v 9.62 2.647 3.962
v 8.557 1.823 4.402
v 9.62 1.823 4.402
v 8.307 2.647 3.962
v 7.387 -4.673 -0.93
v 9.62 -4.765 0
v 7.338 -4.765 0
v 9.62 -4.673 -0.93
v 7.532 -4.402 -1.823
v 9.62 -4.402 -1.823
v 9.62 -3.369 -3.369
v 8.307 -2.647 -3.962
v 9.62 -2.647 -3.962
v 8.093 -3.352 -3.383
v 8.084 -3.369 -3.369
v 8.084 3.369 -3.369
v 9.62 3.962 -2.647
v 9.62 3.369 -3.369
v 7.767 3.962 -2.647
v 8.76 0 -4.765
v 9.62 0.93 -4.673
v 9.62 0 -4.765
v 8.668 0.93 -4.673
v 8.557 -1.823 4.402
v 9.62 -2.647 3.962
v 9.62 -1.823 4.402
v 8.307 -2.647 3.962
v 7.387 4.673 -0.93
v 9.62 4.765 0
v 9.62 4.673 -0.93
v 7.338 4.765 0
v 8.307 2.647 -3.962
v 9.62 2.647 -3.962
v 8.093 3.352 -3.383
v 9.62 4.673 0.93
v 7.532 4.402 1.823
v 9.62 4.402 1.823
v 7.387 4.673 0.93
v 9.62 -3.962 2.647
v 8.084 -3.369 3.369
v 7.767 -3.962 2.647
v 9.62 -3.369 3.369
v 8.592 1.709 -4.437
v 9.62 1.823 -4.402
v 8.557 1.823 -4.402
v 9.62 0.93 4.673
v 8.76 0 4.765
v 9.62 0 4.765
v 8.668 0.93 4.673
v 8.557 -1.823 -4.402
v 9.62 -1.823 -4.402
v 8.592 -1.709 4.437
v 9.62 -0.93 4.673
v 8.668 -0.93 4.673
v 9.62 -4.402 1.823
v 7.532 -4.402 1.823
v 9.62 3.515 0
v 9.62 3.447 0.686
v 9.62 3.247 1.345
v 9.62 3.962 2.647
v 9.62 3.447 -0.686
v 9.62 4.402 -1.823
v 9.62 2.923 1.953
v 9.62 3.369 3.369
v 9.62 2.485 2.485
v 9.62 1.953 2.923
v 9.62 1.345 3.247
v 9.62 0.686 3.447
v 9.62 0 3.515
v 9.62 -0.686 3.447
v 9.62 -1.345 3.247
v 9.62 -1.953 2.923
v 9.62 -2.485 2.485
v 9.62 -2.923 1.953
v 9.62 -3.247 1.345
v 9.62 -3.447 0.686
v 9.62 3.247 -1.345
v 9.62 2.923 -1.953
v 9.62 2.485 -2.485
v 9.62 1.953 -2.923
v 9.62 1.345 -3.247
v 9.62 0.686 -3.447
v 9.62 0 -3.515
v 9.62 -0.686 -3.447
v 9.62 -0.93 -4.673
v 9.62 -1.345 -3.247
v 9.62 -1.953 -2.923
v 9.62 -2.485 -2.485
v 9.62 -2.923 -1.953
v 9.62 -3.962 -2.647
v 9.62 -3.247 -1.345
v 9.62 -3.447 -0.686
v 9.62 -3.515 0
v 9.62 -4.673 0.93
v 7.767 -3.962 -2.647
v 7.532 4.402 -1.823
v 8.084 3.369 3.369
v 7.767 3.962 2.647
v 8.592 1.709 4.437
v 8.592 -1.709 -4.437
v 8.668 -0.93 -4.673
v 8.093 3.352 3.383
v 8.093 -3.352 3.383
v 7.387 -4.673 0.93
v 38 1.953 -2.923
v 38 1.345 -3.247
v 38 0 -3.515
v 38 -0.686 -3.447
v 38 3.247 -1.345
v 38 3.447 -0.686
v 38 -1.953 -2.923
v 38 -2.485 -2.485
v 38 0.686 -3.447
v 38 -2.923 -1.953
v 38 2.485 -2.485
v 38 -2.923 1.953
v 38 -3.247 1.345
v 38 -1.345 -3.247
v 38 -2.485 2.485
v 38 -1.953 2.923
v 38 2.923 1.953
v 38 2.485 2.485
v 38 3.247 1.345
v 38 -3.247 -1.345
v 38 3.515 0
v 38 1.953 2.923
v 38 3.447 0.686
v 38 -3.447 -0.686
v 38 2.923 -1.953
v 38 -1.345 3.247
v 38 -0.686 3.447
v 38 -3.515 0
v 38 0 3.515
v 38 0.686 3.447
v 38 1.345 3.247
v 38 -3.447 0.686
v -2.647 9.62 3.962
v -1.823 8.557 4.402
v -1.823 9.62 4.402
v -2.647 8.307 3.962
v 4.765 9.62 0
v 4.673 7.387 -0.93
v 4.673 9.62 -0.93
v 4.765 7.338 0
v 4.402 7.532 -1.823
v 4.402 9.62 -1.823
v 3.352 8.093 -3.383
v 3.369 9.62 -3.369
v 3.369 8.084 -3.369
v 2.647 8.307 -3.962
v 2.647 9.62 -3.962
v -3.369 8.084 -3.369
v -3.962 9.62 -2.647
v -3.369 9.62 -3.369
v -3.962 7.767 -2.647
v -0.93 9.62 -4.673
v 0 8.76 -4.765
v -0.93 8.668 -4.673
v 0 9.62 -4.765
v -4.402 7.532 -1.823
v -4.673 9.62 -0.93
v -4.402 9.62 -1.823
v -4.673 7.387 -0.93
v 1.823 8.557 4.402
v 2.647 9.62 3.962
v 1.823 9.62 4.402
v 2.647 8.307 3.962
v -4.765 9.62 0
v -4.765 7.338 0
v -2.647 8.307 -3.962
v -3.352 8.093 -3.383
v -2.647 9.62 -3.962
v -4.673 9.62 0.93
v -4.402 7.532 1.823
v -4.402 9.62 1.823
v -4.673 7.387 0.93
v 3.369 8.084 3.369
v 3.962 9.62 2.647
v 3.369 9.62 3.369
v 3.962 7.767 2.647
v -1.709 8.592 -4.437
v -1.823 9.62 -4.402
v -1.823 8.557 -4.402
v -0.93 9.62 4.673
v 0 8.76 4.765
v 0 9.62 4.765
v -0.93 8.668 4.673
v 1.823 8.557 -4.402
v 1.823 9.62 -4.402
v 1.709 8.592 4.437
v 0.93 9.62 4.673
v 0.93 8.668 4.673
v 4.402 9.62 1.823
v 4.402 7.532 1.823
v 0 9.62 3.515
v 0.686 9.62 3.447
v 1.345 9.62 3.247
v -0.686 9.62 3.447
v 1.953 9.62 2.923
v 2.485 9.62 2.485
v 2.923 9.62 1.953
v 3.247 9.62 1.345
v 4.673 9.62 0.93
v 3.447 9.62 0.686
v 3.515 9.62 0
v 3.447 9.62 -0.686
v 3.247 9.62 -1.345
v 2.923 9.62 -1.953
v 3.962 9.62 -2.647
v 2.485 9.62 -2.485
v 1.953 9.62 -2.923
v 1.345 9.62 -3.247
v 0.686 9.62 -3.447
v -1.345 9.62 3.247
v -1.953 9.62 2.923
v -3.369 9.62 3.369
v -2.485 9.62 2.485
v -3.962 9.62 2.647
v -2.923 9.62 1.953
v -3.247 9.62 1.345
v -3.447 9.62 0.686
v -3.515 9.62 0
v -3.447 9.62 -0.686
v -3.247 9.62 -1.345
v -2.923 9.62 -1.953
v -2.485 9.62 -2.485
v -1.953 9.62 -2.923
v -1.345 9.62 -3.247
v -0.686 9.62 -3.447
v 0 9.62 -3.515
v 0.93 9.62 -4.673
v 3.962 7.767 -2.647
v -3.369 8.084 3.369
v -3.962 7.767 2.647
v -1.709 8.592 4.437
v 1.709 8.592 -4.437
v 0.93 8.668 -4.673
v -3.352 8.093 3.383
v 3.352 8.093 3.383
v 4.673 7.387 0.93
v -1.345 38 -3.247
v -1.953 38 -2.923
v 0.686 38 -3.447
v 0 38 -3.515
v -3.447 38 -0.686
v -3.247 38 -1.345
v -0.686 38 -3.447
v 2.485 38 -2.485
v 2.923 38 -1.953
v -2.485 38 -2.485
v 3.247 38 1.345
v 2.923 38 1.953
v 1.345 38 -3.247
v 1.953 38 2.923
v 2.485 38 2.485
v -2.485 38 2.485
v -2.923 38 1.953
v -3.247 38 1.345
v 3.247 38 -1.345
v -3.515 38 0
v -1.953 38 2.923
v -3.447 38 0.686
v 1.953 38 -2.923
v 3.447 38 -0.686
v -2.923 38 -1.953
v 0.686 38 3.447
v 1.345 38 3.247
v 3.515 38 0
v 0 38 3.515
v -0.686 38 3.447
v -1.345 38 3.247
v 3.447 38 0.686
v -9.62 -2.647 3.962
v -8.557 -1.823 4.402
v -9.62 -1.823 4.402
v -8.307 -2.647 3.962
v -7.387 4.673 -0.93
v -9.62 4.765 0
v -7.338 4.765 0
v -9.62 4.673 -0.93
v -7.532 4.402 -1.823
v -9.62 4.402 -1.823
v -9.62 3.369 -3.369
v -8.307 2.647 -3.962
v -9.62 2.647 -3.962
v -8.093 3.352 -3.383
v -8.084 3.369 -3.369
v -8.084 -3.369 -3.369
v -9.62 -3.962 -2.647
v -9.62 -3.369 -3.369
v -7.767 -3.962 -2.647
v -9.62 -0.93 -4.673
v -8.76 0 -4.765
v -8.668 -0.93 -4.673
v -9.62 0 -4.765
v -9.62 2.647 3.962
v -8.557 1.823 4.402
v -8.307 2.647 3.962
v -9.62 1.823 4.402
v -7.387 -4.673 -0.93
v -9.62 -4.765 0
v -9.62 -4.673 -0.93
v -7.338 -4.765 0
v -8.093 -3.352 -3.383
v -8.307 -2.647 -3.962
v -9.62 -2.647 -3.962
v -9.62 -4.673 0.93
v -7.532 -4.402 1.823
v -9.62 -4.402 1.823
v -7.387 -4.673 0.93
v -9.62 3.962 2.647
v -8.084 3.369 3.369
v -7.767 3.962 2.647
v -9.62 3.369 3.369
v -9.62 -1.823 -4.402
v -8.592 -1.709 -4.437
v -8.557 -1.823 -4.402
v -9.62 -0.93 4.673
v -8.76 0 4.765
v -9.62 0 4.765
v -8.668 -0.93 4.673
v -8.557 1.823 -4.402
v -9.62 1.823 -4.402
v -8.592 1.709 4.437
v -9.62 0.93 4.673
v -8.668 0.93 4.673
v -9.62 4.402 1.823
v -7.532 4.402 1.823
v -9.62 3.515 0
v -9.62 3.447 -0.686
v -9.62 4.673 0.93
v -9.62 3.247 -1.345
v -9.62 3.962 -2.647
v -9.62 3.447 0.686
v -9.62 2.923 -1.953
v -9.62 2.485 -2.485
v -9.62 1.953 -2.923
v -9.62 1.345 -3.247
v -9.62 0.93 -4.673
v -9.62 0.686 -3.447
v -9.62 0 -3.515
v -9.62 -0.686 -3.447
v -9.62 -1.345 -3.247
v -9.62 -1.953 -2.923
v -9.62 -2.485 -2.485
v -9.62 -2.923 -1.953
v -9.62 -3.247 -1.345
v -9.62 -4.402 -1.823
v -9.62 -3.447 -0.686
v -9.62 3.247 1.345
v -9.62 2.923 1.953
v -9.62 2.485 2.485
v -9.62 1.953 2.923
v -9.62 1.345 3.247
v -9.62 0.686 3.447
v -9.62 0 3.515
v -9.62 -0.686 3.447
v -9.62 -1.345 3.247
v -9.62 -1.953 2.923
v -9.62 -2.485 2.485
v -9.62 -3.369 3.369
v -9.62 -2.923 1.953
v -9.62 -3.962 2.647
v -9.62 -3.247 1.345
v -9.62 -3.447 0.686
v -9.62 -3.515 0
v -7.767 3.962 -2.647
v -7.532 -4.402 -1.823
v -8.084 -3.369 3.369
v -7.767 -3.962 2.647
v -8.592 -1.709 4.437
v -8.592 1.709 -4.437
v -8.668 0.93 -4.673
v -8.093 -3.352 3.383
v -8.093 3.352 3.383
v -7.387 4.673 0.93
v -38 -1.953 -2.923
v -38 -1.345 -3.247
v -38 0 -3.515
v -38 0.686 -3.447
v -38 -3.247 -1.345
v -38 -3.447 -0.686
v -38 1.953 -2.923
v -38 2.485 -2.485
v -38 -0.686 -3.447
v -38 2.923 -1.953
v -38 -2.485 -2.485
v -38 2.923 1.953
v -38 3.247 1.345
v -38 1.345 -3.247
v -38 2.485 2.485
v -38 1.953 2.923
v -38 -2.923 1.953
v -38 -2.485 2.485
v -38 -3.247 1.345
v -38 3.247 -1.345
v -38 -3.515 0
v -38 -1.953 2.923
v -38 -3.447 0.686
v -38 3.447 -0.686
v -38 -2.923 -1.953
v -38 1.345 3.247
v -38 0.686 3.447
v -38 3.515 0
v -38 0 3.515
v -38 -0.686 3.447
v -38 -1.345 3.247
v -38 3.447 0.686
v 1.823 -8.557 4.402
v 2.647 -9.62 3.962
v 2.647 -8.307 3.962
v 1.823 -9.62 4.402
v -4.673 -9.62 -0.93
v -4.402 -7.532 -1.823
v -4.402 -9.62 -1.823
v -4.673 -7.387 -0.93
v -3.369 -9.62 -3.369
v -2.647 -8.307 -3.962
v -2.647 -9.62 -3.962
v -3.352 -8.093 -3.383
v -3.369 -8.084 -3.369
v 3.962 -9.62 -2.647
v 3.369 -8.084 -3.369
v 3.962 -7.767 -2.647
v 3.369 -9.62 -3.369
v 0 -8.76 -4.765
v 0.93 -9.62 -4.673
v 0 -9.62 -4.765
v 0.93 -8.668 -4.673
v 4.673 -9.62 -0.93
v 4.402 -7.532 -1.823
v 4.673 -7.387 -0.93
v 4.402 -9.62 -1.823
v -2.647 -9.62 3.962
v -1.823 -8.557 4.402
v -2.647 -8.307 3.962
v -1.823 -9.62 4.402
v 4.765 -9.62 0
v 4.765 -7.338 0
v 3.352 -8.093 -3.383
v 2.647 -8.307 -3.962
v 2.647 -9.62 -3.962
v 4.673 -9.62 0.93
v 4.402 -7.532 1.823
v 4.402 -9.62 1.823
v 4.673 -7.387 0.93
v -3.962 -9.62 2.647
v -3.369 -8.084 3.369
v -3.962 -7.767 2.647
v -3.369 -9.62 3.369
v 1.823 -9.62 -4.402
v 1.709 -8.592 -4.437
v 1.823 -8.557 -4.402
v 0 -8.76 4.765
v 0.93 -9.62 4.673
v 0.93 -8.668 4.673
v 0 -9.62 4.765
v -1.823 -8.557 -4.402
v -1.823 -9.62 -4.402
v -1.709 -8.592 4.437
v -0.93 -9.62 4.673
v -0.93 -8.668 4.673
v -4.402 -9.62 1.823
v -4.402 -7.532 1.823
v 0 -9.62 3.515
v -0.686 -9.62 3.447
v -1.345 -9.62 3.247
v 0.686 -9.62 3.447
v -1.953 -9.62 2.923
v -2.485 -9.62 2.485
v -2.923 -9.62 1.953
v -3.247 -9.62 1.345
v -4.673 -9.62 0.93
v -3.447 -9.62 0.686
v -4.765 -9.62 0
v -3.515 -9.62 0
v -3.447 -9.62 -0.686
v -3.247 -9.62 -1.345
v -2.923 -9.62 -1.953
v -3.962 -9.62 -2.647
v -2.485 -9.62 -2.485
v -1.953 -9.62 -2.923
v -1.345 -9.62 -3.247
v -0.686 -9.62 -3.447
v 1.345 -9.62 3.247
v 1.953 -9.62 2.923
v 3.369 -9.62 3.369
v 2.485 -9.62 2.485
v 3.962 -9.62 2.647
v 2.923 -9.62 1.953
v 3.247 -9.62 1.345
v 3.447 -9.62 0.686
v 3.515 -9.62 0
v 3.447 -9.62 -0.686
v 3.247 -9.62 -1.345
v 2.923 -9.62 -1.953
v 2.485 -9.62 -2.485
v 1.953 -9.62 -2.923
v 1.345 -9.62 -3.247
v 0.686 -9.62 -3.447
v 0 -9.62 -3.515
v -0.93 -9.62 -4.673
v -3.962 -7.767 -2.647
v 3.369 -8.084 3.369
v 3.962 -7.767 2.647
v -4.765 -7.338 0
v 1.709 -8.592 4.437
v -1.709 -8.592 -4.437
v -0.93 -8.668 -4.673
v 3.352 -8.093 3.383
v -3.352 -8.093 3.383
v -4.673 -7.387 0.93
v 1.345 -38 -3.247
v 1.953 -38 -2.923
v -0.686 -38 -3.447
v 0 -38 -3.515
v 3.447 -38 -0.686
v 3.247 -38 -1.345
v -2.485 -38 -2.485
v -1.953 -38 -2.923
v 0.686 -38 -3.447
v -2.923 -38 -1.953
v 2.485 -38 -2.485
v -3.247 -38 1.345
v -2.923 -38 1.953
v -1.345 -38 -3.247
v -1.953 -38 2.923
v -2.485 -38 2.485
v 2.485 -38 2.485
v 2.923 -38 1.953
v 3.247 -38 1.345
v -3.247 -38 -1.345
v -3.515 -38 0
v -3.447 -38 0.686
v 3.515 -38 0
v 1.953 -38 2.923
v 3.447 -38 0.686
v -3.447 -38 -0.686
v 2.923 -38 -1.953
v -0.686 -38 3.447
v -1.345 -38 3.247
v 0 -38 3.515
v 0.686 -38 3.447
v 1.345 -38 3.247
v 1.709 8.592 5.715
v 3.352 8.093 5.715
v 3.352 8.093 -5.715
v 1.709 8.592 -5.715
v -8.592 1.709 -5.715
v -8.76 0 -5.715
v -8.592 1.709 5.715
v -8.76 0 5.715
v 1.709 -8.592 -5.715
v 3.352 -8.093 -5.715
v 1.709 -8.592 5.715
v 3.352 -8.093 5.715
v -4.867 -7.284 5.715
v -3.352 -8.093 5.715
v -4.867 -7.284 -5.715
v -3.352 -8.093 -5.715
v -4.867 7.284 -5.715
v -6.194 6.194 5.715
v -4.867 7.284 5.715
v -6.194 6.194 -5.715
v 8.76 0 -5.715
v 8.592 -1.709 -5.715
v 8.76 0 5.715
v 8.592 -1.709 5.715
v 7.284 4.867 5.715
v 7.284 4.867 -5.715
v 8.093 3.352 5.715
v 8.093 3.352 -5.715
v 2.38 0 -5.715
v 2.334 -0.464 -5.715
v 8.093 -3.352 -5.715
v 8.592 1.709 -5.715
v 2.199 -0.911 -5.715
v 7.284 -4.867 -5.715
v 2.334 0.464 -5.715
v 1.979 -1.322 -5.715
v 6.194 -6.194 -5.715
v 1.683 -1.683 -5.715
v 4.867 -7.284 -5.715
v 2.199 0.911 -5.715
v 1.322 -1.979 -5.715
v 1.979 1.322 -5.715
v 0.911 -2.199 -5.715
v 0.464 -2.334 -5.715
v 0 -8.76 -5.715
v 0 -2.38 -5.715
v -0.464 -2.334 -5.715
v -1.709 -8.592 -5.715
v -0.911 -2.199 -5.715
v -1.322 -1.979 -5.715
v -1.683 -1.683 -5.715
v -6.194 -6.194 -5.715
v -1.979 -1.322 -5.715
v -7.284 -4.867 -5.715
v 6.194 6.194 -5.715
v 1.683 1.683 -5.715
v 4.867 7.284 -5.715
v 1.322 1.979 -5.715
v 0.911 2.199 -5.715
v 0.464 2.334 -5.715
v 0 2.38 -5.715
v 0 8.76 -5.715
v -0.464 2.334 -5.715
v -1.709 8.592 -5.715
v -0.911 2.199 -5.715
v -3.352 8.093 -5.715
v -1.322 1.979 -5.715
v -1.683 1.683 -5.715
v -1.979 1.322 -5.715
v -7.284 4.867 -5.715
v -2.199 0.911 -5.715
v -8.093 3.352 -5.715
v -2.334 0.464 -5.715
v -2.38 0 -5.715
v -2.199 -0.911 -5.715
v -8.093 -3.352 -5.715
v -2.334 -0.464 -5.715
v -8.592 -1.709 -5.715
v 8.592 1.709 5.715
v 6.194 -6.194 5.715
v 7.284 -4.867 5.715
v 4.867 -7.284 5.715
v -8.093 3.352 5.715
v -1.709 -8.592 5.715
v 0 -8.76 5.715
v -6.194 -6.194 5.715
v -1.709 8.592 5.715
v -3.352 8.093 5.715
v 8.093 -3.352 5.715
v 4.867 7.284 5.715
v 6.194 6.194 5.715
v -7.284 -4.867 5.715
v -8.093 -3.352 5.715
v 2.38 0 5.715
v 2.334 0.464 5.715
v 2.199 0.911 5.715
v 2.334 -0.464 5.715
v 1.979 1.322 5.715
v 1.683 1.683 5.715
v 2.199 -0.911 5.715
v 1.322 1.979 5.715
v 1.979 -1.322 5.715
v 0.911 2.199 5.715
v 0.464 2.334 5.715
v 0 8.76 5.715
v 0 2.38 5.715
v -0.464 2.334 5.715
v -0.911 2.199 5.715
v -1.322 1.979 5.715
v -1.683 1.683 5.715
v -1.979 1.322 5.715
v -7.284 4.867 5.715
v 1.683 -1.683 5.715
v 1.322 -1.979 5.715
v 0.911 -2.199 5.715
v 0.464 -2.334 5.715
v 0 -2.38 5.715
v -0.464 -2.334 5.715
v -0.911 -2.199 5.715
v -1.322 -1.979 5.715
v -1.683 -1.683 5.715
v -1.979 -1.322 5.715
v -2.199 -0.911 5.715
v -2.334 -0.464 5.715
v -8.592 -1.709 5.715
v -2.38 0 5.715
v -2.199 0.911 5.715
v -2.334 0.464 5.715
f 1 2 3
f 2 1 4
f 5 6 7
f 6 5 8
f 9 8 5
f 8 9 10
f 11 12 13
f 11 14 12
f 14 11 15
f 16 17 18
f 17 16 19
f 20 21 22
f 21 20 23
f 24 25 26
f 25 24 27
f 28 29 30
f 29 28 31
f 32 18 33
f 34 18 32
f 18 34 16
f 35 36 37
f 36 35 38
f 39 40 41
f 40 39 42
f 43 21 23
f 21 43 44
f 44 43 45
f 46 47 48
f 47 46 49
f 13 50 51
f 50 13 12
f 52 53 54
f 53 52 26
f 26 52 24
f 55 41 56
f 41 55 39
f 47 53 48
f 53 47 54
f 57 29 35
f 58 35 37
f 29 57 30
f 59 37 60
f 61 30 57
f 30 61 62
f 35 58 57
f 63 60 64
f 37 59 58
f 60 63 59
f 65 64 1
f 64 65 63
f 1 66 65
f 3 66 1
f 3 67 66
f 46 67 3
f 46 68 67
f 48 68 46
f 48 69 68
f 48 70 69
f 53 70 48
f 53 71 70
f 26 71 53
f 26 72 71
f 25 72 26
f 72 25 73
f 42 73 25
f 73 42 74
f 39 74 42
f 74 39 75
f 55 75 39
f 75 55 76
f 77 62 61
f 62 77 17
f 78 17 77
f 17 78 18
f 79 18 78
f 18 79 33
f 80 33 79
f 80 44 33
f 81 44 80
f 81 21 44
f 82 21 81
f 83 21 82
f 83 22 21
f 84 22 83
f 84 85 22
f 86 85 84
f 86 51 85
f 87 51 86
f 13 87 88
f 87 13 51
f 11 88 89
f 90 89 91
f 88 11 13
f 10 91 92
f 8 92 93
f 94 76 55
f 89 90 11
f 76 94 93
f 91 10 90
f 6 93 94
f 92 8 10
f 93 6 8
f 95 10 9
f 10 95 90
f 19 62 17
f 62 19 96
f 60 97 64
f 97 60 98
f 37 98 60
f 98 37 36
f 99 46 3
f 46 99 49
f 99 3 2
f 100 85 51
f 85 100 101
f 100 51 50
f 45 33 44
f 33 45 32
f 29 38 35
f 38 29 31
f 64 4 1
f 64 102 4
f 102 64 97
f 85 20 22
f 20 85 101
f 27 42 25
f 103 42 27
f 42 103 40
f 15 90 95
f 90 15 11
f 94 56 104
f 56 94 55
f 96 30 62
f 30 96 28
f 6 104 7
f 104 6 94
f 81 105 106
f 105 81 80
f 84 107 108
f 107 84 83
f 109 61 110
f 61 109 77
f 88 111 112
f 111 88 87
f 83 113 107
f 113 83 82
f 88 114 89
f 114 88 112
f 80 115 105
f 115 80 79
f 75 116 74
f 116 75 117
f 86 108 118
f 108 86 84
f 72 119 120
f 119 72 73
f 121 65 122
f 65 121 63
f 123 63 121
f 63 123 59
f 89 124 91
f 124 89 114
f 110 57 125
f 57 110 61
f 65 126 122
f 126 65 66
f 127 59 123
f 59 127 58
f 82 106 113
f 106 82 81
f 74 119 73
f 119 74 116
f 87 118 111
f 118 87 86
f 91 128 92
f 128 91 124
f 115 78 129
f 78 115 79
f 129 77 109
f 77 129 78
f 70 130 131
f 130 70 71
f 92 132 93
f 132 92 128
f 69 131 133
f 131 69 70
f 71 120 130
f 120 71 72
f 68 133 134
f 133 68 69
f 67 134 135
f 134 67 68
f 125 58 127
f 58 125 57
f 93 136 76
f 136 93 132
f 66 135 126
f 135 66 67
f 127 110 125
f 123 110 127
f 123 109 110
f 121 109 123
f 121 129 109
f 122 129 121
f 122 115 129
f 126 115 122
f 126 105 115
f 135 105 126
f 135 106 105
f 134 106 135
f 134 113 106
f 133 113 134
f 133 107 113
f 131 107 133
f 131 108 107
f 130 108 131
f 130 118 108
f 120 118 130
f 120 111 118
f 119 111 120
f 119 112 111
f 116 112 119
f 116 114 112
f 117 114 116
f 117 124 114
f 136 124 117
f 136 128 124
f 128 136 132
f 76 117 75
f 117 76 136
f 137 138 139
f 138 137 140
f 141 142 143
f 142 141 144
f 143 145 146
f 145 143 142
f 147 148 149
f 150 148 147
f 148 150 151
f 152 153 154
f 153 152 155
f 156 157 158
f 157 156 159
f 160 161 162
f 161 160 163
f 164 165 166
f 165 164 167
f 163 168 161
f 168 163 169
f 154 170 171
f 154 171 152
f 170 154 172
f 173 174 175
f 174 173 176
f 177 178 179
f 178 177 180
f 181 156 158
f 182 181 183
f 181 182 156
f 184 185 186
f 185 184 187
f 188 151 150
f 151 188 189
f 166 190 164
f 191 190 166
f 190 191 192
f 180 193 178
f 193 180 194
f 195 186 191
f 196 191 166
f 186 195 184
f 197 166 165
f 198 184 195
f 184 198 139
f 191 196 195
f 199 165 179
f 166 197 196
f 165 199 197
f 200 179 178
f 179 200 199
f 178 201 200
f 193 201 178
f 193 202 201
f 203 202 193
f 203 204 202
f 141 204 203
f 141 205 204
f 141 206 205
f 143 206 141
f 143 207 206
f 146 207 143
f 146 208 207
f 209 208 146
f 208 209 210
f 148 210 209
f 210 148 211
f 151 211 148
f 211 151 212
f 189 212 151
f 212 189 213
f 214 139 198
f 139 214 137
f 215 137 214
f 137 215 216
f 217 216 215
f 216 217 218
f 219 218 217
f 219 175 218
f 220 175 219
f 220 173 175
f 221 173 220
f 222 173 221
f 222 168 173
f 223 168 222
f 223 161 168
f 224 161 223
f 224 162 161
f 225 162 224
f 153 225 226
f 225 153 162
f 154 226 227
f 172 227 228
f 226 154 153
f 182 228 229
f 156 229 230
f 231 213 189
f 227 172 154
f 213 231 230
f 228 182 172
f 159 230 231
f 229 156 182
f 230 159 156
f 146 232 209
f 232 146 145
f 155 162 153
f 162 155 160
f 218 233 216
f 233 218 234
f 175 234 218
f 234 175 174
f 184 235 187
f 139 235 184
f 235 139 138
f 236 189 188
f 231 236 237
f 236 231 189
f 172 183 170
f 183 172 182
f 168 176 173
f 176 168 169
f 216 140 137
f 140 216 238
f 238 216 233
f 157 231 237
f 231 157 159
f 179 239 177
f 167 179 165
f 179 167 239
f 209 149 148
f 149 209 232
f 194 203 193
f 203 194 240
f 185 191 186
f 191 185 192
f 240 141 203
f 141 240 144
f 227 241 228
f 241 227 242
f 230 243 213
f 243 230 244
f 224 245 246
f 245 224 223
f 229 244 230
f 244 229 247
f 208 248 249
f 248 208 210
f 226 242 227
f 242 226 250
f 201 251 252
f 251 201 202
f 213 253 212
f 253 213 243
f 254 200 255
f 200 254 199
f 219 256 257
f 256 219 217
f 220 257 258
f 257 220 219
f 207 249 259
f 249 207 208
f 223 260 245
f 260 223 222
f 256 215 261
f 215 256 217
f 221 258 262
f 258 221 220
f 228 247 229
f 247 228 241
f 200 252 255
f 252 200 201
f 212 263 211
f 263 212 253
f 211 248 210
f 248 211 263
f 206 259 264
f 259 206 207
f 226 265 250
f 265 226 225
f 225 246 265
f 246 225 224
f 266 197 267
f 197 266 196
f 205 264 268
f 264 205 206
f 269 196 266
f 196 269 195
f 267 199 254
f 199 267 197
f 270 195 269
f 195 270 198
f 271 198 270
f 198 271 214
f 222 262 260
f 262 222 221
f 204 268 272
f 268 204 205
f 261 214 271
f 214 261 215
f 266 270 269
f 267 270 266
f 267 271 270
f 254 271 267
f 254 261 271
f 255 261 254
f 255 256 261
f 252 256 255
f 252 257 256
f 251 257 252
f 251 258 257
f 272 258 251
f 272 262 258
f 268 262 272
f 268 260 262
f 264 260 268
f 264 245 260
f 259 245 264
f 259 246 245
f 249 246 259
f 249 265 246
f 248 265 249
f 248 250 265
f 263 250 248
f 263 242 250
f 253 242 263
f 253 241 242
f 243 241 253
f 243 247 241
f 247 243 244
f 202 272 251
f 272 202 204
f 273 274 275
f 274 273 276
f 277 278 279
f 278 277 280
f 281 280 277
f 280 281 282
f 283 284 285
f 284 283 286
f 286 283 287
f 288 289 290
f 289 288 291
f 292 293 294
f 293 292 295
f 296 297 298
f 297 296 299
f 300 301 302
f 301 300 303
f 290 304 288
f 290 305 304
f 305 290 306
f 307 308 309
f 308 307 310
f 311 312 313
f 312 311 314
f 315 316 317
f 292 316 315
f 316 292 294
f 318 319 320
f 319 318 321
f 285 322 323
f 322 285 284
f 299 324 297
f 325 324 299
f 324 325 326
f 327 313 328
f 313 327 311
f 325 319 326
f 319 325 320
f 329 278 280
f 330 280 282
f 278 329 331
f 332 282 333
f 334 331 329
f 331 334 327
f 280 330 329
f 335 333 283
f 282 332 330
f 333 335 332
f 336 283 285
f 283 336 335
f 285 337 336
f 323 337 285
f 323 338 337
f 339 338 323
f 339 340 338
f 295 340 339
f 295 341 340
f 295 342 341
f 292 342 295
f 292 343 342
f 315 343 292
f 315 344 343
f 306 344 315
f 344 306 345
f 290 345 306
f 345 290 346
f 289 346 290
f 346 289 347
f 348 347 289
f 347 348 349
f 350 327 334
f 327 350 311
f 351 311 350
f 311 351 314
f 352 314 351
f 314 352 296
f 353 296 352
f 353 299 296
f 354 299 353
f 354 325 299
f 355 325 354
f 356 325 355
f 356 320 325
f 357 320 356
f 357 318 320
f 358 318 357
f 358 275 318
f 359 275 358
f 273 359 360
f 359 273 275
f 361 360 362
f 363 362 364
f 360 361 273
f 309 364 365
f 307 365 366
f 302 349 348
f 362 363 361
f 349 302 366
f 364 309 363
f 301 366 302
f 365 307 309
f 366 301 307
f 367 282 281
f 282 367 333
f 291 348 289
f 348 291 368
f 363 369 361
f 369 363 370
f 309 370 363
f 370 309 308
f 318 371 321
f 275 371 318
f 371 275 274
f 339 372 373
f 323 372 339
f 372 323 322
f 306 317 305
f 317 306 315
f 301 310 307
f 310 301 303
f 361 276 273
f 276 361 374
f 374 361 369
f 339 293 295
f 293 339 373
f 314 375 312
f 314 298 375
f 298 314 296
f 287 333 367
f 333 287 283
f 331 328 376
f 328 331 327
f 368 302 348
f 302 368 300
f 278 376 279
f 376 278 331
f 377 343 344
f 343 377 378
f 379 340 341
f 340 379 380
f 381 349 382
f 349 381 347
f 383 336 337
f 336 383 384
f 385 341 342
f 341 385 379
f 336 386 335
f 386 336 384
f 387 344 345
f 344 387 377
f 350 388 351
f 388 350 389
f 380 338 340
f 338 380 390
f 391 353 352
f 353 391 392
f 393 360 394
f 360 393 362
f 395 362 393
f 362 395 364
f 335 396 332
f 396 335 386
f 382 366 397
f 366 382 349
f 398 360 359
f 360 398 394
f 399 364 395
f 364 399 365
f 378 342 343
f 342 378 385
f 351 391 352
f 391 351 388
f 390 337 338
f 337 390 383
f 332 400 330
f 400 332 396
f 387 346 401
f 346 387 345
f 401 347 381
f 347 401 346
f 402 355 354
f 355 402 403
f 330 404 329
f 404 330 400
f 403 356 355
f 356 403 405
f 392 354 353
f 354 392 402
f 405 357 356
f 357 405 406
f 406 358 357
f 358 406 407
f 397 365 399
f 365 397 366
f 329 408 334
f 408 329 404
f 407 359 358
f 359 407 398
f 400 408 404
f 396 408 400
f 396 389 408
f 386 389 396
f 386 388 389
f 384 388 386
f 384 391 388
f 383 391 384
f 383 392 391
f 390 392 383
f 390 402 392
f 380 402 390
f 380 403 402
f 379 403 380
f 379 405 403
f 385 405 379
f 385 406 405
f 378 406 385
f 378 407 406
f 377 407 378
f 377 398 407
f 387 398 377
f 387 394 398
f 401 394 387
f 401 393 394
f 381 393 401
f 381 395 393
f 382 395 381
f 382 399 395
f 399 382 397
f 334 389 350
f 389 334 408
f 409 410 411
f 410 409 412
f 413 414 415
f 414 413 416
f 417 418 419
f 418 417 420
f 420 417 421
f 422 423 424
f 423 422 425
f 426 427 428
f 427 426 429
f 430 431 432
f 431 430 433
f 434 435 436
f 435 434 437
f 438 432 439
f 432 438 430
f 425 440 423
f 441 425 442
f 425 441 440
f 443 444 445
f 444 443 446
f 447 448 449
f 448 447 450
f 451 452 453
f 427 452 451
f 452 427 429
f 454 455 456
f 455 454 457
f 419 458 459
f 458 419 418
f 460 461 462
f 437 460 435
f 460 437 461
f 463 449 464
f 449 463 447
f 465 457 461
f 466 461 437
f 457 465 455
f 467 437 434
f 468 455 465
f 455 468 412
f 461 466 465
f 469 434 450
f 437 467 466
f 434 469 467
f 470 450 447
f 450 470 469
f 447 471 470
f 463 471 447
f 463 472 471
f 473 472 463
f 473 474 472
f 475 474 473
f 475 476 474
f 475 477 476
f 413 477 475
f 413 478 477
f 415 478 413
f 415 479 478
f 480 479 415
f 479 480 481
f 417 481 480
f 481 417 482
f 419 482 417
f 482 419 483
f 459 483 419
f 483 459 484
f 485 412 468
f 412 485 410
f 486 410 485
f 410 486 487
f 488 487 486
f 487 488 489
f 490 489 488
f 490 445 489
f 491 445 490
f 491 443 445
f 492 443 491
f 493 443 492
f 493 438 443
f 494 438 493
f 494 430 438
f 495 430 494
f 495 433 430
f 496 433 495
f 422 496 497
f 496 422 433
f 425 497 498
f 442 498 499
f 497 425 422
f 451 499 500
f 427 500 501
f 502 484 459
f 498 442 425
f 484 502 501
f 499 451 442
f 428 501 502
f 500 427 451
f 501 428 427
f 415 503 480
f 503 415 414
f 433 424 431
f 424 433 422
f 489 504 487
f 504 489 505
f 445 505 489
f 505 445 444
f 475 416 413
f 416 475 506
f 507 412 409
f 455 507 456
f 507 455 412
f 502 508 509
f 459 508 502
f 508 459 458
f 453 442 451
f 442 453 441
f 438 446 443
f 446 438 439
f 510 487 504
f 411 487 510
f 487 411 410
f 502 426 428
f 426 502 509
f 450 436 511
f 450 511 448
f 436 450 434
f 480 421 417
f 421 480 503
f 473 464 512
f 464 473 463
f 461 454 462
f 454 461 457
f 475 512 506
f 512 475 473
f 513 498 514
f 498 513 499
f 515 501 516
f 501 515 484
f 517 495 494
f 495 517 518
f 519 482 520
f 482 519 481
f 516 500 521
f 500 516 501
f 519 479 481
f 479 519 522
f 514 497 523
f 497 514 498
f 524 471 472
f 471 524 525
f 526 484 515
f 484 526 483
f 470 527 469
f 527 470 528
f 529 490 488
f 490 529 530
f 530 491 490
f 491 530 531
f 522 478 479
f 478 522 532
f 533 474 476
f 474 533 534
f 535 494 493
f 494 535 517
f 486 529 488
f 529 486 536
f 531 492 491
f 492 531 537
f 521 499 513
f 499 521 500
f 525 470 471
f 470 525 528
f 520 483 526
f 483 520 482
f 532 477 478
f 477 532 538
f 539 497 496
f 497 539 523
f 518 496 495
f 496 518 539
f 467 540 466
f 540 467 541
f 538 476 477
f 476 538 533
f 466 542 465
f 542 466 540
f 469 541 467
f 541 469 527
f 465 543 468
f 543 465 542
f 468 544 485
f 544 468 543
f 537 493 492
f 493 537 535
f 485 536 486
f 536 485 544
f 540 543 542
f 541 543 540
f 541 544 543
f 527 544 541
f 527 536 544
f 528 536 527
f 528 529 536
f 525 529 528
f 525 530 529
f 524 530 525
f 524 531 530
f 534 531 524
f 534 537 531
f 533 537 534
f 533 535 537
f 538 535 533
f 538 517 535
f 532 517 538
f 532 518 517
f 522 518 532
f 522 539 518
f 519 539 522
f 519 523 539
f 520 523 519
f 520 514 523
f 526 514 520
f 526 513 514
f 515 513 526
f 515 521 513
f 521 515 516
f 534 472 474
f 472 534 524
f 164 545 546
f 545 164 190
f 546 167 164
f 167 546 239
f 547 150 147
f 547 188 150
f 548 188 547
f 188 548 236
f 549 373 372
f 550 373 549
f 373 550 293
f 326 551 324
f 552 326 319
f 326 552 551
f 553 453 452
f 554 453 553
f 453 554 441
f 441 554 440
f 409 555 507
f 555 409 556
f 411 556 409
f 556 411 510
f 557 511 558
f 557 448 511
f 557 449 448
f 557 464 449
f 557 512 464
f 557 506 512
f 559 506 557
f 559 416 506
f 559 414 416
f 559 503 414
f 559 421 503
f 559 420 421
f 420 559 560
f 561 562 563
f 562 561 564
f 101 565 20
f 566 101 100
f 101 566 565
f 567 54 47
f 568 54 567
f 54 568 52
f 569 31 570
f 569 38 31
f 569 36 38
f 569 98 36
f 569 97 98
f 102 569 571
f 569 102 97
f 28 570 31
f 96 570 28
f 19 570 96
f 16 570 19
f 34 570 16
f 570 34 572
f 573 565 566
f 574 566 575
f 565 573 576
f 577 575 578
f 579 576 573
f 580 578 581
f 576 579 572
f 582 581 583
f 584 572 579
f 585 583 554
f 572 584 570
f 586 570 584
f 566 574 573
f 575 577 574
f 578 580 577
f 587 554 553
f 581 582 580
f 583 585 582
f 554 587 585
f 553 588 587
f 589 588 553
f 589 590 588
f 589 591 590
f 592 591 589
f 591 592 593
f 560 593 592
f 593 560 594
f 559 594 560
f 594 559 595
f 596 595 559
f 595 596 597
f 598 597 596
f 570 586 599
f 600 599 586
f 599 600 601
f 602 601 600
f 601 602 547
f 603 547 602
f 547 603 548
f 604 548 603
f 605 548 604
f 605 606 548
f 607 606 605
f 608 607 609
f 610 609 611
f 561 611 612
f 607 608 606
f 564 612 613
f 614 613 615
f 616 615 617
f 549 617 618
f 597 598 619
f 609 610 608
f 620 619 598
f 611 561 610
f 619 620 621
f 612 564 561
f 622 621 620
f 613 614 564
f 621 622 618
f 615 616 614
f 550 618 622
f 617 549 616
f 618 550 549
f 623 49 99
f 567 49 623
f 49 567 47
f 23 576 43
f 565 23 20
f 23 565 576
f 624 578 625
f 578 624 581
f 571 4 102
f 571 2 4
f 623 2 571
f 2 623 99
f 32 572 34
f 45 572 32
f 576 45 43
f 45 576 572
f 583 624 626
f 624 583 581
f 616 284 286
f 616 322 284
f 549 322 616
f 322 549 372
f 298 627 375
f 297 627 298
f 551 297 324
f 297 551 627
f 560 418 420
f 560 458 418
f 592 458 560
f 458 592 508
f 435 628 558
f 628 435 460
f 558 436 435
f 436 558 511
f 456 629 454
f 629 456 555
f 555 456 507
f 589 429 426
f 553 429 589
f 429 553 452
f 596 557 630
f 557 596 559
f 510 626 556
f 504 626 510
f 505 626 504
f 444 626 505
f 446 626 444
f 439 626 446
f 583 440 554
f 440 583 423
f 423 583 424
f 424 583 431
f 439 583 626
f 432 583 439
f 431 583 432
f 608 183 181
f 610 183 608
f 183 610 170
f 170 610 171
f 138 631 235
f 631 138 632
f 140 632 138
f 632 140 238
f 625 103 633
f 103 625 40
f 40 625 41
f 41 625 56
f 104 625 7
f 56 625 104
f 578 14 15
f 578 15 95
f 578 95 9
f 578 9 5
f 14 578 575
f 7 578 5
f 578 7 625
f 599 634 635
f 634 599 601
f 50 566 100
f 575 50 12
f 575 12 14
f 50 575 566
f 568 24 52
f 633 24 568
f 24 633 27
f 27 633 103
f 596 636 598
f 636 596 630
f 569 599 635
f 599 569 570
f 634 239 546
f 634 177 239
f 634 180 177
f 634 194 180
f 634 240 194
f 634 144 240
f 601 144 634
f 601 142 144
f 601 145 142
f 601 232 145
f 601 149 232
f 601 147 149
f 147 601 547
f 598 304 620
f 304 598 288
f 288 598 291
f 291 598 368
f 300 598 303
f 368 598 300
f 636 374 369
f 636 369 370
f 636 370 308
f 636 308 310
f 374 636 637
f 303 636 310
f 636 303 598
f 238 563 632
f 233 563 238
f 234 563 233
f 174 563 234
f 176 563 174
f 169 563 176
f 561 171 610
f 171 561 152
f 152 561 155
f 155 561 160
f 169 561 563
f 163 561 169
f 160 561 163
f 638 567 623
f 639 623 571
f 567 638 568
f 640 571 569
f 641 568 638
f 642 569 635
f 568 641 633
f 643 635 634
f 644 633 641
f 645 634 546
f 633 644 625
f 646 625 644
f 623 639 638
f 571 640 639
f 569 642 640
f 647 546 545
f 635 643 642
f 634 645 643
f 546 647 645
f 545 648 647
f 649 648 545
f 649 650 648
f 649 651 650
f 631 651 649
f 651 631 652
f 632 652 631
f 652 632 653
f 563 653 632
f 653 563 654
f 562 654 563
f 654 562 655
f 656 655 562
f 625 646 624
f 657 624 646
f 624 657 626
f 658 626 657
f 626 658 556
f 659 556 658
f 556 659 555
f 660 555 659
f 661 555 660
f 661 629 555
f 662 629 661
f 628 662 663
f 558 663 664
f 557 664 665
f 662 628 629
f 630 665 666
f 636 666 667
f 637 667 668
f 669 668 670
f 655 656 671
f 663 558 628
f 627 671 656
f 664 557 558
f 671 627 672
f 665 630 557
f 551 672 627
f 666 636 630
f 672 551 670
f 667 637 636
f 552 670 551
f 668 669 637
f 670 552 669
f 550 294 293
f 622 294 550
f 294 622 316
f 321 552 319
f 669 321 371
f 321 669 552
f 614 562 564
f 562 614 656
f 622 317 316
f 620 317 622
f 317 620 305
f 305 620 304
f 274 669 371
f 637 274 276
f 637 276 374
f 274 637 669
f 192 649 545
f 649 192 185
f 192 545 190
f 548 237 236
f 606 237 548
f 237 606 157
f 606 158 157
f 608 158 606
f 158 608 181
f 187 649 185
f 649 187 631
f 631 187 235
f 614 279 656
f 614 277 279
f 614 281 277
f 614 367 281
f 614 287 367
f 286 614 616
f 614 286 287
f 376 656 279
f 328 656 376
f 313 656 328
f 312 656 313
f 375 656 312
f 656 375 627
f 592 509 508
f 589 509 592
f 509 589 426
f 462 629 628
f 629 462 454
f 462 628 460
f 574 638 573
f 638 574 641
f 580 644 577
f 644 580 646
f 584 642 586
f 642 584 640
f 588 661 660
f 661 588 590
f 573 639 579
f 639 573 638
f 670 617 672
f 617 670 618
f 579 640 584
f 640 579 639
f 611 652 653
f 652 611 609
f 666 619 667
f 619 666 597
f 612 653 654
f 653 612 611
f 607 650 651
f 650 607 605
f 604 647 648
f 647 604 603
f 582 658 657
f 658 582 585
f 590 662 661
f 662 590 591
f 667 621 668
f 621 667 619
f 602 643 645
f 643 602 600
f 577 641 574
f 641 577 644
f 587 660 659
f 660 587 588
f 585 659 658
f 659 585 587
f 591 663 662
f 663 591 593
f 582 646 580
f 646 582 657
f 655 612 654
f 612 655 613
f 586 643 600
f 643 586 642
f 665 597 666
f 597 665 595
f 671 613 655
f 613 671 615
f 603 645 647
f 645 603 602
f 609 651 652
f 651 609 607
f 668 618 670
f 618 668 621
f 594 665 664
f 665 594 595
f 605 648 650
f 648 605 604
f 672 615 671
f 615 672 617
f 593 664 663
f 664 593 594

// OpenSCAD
$fn = 32;

// ----------------------------------------------------------------------
// Cardan cross: 76 mm span, 9.53 mm trunnions
// ----------------------------------------------------------------------

// --- parameters (mm) ---
journal_d = 9.53;         // trunnion diameter
arm_len = 38;             // trunnion length from the centre
step_r = 3.24;            // step position from the centre
step_d = 7.03;            // journal diameter after the step
hub_d = 17.52;            // hub diameter
hub_h = 11.43;            // hub height
bore_d = 4.76;            // hub bore

difference() {
  union() {
    /* hub along the joint axis */
    cylinder(h = hub_h, d = hub_d, center = true);
    for (a = [0 : 90 : 270]) rotate([0, 0, a]) {
      /* trunnion, sunk into the hub */
      translate([hub_d / 4, 0, 0]) rotate([0, 90, 0]) cylinder(h = step_r + 2, d = journal_d);
      /* stepped journal out to the tip */
      translate([step_r - 0.5, 0, 0]) rotate([0, 90, 0]) cylinder(h = arm_len + 0.5 - step_r, d = step_d);
    }
  }
  /* lubrication bore through the hub, 2.5 mm clear on both sides */
  translate([0, 0, -hub_h / 2 - 2.5]) cylinder(h = hub_h + 5, d = bore_d);
}
